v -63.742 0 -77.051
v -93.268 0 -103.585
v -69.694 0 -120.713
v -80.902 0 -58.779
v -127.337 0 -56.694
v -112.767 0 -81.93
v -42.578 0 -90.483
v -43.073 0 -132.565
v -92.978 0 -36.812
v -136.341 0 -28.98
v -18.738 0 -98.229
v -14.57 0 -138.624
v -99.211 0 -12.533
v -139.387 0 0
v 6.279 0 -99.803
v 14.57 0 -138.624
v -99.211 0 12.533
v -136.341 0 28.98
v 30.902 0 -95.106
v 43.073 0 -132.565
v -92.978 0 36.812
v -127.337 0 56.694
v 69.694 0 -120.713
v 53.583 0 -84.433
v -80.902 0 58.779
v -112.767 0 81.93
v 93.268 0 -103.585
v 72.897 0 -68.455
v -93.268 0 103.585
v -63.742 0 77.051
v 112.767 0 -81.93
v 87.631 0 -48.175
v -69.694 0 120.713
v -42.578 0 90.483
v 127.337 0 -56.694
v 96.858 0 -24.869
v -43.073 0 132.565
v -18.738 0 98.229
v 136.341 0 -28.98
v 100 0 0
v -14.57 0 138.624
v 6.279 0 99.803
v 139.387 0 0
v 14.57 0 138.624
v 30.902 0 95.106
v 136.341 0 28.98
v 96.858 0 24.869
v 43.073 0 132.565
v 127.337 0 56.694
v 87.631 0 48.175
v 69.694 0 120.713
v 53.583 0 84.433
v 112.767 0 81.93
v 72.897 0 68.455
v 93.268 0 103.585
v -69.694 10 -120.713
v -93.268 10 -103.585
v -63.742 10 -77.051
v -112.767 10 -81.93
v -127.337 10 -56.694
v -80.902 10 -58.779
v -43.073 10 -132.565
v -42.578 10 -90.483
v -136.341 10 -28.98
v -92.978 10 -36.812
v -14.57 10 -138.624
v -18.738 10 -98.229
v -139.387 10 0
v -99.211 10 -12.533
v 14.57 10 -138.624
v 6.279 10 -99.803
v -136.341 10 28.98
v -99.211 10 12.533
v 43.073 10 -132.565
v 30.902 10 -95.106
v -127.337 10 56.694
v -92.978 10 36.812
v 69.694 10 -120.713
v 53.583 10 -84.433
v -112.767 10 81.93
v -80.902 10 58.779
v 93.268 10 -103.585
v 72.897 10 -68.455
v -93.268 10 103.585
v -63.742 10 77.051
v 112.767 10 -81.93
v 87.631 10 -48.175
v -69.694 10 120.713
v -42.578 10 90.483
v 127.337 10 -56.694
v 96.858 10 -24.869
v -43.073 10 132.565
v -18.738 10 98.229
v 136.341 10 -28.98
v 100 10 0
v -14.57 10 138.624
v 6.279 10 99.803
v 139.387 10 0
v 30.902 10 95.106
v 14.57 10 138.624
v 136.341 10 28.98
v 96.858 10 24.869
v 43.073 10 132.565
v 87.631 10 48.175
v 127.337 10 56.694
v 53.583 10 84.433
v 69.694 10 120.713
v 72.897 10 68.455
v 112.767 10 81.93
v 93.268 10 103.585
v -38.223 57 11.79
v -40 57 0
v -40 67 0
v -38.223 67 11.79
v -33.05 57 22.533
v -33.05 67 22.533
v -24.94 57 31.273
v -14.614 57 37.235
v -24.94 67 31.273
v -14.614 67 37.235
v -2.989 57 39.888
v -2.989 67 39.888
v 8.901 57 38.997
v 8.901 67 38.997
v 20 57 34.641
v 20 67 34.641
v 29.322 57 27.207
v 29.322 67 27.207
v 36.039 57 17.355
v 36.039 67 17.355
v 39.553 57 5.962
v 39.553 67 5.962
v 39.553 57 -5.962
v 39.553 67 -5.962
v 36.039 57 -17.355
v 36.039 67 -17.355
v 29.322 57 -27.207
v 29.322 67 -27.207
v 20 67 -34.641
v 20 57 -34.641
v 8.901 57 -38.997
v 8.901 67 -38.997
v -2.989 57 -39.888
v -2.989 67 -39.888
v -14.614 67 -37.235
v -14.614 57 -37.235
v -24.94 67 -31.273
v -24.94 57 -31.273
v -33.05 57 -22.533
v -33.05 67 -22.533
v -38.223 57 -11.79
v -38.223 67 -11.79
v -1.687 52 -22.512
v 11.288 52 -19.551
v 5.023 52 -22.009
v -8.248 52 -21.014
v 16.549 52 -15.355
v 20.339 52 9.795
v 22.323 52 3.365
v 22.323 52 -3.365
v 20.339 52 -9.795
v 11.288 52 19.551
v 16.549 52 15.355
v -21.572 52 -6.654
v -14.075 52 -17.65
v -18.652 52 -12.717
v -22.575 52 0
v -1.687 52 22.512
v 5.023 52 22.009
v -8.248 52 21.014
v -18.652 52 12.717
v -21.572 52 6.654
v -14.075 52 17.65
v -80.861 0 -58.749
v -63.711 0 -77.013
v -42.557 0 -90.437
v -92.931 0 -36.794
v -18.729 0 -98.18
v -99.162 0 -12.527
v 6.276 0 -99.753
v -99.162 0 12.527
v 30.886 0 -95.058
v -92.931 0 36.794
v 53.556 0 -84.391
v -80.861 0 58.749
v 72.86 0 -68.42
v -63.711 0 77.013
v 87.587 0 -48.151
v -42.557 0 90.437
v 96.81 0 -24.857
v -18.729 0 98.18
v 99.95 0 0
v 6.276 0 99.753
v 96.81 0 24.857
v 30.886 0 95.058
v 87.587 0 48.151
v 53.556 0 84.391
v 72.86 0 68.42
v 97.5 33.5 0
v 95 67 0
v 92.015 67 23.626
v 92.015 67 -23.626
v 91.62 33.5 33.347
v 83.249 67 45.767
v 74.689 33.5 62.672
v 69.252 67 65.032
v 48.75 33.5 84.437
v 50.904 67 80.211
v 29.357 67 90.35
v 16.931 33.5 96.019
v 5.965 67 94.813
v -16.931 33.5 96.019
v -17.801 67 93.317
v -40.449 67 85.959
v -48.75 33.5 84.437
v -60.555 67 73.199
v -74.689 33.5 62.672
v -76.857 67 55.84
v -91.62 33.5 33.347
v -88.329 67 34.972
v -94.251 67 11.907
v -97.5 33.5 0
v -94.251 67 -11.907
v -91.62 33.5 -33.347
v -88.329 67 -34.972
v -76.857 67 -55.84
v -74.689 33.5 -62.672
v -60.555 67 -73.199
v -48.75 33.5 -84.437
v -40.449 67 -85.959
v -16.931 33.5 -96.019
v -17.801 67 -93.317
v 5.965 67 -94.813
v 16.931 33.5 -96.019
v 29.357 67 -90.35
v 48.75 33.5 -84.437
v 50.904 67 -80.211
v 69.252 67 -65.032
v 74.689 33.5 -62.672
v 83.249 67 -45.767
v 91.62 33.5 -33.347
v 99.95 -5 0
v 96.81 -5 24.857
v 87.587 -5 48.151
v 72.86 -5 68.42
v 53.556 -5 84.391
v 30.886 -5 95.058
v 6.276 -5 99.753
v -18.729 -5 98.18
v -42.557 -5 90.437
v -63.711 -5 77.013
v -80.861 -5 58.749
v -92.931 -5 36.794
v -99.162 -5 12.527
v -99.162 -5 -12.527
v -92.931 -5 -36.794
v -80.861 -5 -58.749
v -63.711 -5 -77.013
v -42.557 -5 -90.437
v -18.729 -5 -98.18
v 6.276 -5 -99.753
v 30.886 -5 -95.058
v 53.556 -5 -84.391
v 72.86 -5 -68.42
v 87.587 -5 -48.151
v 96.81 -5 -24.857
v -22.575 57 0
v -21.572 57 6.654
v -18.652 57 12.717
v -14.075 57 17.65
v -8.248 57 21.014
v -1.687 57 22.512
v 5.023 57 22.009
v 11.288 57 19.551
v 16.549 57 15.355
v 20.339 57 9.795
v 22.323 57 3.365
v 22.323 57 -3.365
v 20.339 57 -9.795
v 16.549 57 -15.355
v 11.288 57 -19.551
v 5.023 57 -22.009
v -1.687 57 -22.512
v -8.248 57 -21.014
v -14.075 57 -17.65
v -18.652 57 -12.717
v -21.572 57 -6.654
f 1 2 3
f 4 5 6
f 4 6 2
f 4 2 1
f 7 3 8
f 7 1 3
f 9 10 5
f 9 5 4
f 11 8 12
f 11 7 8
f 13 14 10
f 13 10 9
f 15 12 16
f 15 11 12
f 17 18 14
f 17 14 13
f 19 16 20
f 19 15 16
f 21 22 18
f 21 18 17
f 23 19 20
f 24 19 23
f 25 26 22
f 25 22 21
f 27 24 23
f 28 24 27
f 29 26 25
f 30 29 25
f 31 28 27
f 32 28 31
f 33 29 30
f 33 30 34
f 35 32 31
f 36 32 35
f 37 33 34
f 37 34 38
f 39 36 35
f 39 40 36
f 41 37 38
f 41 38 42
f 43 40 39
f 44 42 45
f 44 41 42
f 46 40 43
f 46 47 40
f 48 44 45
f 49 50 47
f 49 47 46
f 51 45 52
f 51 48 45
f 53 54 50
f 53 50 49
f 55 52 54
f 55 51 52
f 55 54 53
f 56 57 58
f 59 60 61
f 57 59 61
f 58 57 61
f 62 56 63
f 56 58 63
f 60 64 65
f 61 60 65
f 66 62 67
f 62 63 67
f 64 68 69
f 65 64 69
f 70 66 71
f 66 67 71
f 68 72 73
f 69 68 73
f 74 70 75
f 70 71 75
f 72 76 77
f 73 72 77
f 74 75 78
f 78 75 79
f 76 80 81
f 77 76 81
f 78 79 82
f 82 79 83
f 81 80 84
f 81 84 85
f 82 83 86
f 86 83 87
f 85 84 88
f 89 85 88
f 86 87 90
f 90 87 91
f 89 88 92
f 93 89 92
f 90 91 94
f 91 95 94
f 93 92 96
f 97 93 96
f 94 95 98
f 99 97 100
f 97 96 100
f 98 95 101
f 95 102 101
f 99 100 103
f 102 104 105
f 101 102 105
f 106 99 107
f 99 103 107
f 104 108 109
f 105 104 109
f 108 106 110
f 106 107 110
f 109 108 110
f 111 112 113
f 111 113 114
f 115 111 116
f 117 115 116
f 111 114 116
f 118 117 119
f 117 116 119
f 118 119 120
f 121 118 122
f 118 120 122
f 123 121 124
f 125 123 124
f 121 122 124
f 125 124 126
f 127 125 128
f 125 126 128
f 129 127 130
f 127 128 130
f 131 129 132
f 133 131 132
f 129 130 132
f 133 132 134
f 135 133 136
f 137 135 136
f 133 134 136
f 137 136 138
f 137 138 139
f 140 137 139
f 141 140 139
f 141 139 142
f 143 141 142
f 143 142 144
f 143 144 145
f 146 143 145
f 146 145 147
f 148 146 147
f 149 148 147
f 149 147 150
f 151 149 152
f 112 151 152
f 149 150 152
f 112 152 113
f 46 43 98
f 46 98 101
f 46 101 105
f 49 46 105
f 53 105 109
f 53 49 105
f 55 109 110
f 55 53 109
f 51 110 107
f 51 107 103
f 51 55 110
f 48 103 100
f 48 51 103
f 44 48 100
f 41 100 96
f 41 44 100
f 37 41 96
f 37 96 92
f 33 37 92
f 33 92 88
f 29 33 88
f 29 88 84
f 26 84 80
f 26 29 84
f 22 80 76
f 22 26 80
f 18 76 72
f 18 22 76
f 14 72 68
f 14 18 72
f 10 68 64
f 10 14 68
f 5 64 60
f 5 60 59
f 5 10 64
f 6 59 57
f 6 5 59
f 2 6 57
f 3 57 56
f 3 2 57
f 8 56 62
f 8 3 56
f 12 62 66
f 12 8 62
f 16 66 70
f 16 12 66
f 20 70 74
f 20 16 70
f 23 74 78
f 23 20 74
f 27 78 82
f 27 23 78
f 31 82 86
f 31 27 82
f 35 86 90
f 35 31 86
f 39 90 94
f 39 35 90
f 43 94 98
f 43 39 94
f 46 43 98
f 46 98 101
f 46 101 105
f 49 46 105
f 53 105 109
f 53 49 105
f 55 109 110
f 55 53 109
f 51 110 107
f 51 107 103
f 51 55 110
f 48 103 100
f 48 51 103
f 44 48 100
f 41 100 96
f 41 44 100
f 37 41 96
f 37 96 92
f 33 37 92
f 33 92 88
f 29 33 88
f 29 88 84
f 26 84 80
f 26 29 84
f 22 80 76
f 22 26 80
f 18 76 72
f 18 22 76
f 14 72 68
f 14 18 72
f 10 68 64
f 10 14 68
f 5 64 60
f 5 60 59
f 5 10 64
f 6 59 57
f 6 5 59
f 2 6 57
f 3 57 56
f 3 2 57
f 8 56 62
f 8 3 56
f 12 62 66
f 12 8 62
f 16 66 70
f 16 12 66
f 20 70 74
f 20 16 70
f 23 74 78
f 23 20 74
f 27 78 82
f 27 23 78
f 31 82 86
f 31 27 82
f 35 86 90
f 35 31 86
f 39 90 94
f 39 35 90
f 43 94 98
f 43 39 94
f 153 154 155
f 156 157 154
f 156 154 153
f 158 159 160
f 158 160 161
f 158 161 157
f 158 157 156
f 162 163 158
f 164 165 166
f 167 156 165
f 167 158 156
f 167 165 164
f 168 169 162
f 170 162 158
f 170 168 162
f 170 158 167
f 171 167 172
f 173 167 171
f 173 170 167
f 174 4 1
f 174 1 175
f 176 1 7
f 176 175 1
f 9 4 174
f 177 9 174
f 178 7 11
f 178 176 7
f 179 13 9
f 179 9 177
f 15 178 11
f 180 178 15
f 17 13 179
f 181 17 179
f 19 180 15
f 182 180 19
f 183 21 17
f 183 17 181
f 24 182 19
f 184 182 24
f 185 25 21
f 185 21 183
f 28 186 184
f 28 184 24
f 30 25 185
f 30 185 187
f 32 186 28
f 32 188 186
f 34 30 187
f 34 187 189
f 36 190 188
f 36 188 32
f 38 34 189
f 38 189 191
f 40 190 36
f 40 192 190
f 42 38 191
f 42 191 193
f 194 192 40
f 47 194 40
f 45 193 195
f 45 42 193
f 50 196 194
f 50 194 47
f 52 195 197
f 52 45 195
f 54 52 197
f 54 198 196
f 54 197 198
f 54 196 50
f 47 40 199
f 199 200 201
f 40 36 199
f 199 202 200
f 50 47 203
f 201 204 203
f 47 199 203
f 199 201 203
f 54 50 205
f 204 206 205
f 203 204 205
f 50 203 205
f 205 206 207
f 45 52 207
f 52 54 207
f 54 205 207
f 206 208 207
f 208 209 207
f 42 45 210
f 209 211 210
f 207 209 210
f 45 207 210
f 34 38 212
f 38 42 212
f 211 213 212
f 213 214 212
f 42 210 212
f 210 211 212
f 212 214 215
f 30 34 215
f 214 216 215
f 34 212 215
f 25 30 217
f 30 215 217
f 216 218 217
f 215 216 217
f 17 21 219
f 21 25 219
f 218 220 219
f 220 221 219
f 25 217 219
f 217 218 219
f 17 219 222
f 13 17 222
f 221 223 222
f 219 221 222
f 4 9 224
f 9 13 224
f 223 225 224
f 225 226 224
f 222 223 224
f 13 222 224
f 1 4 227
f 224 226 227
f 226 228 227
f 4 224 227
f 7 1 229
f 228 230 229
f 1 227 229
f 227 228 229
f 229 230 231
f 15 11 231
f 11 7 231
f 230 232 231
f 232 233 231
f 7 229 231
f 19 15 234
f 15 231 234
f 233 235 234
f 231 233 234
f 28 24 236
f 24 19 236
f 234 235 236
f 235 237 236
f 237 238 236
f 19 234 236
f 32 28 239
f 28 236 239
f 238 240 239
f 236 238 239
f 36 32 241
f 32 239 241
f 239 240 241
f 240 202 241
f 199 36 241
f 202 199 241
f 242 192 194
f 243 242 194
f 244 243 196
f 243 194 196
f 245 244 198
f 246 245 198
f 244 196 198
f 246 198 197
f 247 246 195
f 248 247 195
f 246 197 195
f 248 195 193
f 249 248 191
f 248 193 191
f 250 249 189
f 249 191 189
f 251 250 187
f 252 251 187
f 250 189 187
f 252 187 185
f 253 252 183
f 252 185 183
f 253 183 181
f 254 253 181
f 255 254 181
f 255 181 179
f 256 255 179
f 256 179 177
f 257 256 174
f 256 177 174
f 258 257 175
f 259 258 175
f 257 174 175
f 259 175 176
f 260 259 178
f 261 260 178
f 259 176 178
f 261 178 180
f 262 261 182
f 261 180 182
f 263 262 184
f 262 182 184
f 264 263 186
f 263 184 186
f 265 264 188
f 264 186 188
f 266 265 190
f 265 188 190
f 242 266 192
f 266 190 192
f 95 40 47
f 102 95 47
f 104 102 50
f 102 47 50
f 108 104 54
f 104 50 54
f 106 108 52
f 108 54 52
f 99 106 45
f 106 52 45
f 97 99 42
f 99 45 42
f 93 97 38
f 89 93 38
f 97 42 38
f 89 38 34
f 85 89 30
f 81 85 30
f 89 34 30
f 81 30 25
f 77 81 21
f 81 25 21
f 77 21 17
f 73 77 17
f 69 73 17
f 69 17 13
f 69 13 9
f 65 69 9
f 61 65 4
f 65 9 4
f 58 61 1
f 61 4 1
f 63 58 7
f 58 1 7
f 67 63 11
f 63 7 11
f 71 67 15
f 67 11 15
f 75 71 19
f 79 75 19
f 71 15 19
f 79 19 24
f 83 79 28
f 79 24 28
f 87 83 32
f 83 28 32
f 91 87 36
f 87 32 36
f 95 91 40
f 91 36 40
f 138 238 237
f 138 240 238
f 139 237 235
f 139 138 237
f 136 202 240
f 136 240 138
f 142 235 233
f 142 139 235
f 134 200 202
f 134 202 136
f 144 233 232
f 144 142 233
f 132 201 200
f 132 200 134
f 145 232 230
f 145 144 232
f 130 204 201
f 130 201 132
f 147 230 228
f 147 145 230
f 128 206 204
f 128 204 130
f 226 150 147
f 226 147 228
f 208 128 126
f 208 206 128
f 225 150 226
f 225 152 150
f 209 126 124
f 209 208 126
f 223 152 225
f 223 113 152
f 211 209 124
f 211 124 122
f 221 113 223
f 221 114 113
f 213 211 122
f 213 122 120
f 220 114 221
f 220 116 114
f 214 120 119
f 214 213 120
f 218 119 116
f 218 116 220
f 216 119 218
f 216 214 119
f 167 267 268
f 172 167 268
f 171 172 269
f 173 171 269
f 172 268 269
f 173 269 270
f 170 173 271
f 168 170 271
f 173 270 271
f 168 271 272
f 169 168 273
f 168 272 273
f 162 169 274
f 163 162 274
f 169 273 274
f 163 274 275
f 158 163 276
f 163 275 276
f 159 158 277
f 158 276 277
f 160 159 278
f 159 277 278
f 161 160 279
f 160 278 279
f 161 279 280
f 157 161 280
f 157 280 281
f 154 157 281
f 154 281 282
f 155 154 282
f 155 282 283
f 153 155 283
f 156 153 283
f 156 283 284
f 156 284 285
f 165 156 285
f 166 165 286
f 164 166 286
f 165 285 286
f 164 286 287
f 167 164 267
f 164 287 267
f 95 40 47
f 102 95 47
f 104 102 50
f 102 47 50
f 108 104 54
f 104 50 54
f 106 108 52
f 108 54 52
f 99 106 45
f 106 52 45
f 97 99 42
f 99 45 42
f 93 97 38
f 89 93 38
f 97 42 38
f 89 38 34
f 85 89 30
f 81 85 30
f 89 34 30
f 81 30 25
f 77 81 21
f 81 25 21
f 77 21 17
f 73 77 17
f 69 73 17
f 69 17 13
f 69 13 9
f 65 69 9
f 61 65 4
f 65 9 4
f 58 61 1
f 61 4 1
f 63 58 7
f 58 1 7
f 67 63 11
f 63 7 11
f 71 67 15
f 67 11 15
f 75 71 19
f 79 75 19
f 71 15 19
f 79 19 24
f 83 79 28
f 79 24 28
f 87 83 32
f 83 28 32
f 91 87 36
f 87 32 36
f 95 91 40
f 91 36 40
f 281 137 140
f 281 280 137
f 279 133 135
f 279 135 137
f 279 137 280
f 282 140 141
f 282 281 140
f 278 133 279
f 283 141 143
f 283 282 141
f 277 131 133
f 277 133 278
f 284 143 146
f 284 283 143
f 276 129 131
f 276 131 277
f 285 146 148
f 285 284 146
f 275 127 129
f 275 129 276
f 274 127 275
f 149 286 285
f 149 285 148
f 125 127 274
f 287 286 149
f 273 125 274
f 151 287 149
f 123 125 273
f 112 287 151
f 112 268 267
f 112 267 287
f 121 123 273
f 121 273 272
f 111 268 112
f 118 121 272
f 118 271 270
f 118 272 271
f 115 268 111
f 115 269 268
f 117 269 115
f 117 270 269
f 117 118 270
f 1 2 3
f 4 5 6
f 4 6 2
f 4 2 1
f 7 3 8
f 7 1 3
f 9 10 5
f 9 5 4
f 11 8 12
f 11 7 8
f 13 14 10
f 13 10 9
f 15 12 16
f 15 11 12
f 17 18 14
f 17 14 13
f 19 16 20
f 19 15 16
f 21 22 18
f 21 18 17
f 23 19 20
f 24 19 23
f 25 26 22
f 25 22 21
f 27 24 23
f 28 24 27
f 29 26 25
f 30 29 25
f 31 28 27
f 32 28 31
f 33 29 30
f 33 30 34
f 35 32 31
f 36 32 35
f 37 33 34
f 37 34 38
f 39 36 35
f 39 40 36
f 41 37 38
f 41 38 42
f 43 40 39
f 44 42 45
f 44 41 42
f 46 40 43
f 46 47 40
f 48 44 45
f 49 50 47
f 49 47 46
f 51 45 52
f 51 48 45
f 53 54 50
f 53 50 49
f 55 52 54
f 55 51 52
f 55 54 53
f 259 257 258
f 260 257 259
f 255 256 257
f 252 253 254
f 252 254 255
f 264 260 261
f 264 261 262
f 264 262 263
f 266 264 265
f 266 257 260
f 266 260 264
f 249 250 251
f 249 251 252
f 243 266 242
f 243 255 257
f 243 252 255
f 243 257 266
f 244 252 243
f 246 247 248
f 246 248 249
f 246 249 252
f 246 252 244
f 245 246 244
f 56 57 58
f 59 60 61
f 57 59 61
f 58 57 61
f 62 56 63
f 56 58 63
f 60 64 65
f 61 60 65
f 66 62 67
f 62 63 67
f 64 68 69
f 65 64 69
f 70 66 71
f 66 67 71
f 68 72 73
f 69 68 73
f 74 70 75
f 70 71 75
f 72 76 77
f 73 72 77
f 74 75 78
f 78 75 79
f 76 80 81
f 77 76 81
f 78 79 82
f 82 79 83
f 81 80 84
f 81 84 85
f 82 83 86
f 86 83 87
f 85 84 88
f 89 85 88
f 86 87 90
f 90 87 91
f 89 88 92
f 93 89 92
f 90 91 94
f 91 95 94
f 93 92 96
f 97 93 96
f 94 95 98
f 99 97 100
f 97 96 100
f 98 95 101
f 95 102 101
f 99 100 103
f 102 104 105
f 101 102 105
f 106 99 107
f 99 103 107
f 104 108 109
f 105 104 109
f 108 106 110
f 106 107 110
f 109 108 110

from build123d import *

# Parameters (mm, degrees)
F0_R      = 139.3871605201
F0_R_2    = 100
F1_DEPTH  = 10
F2_DEPTH  = 10
F0_R_3    = 99.95
F4_DEPTH  = 5
F3_R      = 100
F6_R      = 95
F8_R      = 40
F9_DEPTH  = 10
F10_R     = 22.575
F11_DEPTH = 5


# Not quite as in the source:
# - a feature names something its author has since deleted; it is built from what else it names


with BuildPart() as f1:
    # F0 (on Front) → F1 (new body)
    with BuildSketch(Plane.XZ):
        Circle(F0_R)
        Circle(F0_R_2, mode=Mode.SUBTRACT)
    extrude(amount=-F1_DEPTH)


with BuildPart() as f2:
    # F0 (on Front) → F2 (new body)
    with BuildSketch(Plane.XZ):
        Circle(F0_R)
        Circle(F0_R_2, mode=Mode.SUBTRACT)
    extrude(amount=-F2_DEPTH)


with BuildPart() as f4:
    # F0 (on Front) → F4 (new body)
    with BuildSketch(Plane.XZ):
        Circle(F0_R_3)
    extrude(amount=F4_DEPTH)

    # F3 (on face) → F7 section 0
    with BuildSketch(Plane.XZ):
        Circle(F3_R)
    # F6 (on offset) → F7 section 1
    with BuildSketch(Plane(origin=(0, 67, 0), x_dir=(-1, 0, 0), z_dir=(0, 1, 0))):
        Circle(F6_R)
    loft()

    # F8 (on offset) → F9 (cut)
    with BuildSketch(Plane(origin=(0, 67, 0), x_dir=(-1, 0, 0), z_dir=(0, 1, 0))):
        Circle(F8_R)
    extrude(amount=-F9_DEPTH, mode=Mode.SUBTRACT)

    # F10 (on face) → F11 (cut)
    with BuildSketch(Plane(origin=(0, 57, 0), x_dir=(-1, 0, 0), z_dir=(0, 1, 0))):
        Circle(F10_R)
    extrude(amount=-F11_DEPTH, mode=Mode.SUBTRACT)


solid = Compound([f1.part, f2.part, f4.part])
